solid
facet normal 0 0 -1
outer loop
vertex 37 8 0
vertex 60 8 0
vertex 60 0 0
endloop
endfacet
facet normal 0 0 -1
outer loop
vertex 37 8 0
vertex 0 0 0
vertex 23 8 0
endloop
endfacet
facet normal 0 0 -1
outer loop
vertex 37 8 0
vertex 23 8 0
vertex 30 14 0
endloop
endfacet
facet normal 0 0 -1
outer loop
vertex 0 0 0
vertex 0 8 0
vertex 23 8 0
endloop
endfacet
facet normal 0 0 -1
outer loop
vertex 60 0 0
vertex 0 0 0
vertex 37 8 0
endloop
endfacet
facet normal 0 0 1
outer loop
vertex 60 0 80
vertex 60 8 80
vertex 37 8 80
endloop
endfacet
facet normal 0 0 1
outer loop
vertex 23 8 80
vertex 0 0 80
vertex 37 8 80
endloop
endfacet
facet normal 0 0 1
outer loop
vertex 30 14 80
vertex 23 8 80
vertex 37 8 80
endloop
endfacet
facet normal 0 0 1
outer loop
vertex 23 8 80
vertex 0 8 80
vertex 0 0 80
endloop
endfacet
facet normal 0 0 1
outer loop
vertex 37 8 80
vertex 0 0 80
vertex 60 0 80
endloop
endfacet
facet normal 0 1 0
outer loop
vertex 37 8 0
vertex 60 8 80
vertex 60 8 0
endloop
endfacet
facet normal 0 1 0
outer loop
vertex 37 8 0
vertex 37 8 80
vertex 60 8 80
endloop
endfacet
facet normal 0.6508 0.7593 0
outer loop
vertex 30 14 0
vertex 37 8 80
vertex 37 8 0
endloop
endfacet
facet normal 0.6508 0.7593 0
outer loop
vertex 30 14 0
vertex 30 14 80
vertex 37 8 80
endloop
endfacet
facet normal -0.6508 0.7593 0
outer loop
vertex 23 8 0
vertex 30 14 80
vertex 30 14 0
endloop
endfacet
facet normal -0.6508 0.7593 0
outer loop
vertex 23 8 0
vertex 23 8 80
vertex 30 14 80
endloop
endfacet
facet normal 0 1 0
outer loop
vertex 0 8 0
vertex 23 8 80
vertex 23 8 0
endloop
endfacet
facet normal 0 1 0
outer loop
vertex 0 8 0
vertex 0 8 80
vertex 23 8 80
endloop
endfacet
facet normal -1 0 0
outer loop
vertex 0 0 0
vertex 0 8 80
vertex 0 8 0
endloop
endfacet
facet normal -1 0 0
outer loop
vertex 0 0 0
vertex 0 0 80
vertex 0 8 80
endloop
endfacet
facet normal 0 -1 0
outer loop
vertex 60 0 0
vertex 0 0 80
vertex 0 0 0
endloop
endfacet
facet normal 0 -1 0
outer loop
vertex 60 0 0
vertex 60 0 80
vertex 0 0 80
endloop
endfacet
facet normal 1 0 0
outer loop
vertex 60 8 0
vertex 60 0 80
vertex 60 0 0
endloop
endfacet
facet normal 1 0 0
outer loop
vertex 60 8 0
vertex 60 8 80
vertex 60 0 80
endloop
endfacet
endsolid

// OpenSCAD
$fn = 32;

// ----------------------------------------------------------------------
// V guide rail: vrib, 60 mm wide
// ----------------------------------------------------------------------

// --- parameters (mm) ---
rail_w = 60;              // rail width, X
base_t = 8;               // base plate thickness
v_depth = 6;              // V feature depth / height
v_half_w = 7;             // half width of the V at the base face
plate_t = 80;             // rail length, Z (the extrusion height)

profile = [[0, 0], [60, 0], [60, 8], [37, 8], [30, 14], [23, 8], [0, 8]];  // primary outline, 7 points, counter clockwise

// --- the one profile operation ---
linear_extrude(height = plate_t) polygon(points = profile);
